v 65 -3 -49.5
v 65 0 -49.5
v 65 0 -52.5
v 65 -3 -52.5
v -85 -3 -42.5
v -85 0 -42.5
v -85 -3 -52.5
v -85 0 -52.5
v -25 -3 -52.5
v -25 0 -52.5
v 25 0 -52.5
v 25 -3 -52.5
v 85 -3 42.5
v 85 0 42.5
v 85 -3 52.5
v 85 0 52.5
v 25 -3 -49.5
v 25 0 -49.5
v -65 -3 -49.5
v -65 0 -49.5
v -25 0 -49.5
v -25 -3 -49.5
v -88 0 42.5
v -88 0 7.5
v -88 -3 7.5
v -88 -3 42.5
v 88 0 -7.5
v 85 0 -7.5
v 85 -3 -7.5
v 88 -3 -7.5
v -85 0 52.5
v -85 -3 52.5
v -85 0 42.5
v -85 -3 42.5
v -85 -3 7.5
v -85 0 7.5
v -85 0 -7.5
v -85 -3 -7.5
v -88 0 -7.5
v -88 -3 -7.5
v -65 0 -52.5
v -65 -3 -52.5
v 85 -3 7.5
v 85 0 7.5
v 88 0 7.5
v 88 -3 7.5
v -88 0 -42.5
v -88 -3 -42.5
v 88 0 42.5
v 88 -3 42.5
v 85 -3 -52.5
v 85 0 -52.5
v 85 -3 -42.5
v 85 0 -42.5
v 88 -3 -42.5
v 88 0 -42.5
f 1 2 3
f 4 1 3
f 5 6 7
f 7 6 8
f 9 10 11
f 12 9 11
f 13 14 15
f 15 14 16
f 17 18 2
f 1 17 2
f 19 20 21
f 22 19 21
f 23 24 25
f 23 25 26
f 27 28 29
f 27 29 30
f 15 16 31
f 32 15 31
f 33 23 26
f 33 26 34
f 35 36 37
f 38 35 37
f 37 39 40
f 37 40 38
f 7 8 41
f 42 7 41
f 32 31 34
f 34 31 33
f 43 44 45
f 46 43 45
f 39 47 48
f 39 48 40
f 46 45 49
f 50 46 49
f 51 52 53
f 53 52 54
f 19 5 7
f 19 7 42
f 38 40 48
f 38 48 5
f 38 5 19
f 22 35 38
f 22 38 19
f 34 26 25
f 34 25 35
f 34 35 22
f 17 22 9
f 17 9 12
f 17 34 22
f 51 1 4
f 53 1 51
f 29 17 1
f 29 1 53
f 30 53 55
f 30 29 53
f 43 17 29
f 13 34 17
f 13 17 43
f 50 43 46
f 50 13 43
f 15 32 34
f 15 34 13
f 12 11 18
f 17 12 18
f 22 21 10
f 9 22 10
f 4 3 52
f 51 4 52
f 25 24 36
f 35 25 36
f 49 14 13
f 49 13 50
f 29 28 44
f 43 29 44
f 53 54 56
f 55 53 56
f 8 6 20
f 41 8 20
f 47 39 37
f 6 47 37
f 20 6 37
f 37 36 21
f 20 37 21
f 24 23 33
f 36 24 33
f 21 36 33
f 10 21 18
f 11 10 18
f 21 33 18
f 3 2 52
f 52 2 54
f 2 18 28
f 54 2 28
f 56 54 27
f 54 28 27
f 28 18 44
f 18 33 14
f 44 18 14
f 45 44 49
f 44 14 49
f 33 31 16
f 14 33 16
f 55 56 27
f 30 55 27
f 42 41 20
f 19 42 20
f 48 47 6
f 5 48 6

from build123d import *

# Parameters (mm, degrees)
F0_W     = 3
F0_H     = 35
F1_DEPTH = 3


with BuildPart() as f1:
    # F0 (on Front) → F1 (new body)
    with BuildSketch(Plane.XZ):
        Polygon((85, 42.5), (85, 52.5), (-85, 52.5), (-85, 42.5), (-85, 7.5), (-85, -7.5), (-85, -42.5), (-85, -52.5), (-65, -52.5), (-65, -49.5), (-25, -49.5), (-25, -52.5), (25, -52.5), (25, -49.5), (65, -49.5), (65, -52.5), (85, -52.5), (85, -42.5), (85, -7.5), (85, 7.5), align=None)
        with Locations((-86.5, -25)):
            Rectangle(F0_W, F0_H)
        with Locations((86.5, -25)):
            Rectangle(F0_W, F0_H)
        with Locations((86.5, 25)):
            Rectangle(F0_W, F0_H)
        with Locations((-86.5, 25)):
            Rectangle(F0_W, F0_H)
    extrude(amount=F1_DEPTH)


solid = f1.part
